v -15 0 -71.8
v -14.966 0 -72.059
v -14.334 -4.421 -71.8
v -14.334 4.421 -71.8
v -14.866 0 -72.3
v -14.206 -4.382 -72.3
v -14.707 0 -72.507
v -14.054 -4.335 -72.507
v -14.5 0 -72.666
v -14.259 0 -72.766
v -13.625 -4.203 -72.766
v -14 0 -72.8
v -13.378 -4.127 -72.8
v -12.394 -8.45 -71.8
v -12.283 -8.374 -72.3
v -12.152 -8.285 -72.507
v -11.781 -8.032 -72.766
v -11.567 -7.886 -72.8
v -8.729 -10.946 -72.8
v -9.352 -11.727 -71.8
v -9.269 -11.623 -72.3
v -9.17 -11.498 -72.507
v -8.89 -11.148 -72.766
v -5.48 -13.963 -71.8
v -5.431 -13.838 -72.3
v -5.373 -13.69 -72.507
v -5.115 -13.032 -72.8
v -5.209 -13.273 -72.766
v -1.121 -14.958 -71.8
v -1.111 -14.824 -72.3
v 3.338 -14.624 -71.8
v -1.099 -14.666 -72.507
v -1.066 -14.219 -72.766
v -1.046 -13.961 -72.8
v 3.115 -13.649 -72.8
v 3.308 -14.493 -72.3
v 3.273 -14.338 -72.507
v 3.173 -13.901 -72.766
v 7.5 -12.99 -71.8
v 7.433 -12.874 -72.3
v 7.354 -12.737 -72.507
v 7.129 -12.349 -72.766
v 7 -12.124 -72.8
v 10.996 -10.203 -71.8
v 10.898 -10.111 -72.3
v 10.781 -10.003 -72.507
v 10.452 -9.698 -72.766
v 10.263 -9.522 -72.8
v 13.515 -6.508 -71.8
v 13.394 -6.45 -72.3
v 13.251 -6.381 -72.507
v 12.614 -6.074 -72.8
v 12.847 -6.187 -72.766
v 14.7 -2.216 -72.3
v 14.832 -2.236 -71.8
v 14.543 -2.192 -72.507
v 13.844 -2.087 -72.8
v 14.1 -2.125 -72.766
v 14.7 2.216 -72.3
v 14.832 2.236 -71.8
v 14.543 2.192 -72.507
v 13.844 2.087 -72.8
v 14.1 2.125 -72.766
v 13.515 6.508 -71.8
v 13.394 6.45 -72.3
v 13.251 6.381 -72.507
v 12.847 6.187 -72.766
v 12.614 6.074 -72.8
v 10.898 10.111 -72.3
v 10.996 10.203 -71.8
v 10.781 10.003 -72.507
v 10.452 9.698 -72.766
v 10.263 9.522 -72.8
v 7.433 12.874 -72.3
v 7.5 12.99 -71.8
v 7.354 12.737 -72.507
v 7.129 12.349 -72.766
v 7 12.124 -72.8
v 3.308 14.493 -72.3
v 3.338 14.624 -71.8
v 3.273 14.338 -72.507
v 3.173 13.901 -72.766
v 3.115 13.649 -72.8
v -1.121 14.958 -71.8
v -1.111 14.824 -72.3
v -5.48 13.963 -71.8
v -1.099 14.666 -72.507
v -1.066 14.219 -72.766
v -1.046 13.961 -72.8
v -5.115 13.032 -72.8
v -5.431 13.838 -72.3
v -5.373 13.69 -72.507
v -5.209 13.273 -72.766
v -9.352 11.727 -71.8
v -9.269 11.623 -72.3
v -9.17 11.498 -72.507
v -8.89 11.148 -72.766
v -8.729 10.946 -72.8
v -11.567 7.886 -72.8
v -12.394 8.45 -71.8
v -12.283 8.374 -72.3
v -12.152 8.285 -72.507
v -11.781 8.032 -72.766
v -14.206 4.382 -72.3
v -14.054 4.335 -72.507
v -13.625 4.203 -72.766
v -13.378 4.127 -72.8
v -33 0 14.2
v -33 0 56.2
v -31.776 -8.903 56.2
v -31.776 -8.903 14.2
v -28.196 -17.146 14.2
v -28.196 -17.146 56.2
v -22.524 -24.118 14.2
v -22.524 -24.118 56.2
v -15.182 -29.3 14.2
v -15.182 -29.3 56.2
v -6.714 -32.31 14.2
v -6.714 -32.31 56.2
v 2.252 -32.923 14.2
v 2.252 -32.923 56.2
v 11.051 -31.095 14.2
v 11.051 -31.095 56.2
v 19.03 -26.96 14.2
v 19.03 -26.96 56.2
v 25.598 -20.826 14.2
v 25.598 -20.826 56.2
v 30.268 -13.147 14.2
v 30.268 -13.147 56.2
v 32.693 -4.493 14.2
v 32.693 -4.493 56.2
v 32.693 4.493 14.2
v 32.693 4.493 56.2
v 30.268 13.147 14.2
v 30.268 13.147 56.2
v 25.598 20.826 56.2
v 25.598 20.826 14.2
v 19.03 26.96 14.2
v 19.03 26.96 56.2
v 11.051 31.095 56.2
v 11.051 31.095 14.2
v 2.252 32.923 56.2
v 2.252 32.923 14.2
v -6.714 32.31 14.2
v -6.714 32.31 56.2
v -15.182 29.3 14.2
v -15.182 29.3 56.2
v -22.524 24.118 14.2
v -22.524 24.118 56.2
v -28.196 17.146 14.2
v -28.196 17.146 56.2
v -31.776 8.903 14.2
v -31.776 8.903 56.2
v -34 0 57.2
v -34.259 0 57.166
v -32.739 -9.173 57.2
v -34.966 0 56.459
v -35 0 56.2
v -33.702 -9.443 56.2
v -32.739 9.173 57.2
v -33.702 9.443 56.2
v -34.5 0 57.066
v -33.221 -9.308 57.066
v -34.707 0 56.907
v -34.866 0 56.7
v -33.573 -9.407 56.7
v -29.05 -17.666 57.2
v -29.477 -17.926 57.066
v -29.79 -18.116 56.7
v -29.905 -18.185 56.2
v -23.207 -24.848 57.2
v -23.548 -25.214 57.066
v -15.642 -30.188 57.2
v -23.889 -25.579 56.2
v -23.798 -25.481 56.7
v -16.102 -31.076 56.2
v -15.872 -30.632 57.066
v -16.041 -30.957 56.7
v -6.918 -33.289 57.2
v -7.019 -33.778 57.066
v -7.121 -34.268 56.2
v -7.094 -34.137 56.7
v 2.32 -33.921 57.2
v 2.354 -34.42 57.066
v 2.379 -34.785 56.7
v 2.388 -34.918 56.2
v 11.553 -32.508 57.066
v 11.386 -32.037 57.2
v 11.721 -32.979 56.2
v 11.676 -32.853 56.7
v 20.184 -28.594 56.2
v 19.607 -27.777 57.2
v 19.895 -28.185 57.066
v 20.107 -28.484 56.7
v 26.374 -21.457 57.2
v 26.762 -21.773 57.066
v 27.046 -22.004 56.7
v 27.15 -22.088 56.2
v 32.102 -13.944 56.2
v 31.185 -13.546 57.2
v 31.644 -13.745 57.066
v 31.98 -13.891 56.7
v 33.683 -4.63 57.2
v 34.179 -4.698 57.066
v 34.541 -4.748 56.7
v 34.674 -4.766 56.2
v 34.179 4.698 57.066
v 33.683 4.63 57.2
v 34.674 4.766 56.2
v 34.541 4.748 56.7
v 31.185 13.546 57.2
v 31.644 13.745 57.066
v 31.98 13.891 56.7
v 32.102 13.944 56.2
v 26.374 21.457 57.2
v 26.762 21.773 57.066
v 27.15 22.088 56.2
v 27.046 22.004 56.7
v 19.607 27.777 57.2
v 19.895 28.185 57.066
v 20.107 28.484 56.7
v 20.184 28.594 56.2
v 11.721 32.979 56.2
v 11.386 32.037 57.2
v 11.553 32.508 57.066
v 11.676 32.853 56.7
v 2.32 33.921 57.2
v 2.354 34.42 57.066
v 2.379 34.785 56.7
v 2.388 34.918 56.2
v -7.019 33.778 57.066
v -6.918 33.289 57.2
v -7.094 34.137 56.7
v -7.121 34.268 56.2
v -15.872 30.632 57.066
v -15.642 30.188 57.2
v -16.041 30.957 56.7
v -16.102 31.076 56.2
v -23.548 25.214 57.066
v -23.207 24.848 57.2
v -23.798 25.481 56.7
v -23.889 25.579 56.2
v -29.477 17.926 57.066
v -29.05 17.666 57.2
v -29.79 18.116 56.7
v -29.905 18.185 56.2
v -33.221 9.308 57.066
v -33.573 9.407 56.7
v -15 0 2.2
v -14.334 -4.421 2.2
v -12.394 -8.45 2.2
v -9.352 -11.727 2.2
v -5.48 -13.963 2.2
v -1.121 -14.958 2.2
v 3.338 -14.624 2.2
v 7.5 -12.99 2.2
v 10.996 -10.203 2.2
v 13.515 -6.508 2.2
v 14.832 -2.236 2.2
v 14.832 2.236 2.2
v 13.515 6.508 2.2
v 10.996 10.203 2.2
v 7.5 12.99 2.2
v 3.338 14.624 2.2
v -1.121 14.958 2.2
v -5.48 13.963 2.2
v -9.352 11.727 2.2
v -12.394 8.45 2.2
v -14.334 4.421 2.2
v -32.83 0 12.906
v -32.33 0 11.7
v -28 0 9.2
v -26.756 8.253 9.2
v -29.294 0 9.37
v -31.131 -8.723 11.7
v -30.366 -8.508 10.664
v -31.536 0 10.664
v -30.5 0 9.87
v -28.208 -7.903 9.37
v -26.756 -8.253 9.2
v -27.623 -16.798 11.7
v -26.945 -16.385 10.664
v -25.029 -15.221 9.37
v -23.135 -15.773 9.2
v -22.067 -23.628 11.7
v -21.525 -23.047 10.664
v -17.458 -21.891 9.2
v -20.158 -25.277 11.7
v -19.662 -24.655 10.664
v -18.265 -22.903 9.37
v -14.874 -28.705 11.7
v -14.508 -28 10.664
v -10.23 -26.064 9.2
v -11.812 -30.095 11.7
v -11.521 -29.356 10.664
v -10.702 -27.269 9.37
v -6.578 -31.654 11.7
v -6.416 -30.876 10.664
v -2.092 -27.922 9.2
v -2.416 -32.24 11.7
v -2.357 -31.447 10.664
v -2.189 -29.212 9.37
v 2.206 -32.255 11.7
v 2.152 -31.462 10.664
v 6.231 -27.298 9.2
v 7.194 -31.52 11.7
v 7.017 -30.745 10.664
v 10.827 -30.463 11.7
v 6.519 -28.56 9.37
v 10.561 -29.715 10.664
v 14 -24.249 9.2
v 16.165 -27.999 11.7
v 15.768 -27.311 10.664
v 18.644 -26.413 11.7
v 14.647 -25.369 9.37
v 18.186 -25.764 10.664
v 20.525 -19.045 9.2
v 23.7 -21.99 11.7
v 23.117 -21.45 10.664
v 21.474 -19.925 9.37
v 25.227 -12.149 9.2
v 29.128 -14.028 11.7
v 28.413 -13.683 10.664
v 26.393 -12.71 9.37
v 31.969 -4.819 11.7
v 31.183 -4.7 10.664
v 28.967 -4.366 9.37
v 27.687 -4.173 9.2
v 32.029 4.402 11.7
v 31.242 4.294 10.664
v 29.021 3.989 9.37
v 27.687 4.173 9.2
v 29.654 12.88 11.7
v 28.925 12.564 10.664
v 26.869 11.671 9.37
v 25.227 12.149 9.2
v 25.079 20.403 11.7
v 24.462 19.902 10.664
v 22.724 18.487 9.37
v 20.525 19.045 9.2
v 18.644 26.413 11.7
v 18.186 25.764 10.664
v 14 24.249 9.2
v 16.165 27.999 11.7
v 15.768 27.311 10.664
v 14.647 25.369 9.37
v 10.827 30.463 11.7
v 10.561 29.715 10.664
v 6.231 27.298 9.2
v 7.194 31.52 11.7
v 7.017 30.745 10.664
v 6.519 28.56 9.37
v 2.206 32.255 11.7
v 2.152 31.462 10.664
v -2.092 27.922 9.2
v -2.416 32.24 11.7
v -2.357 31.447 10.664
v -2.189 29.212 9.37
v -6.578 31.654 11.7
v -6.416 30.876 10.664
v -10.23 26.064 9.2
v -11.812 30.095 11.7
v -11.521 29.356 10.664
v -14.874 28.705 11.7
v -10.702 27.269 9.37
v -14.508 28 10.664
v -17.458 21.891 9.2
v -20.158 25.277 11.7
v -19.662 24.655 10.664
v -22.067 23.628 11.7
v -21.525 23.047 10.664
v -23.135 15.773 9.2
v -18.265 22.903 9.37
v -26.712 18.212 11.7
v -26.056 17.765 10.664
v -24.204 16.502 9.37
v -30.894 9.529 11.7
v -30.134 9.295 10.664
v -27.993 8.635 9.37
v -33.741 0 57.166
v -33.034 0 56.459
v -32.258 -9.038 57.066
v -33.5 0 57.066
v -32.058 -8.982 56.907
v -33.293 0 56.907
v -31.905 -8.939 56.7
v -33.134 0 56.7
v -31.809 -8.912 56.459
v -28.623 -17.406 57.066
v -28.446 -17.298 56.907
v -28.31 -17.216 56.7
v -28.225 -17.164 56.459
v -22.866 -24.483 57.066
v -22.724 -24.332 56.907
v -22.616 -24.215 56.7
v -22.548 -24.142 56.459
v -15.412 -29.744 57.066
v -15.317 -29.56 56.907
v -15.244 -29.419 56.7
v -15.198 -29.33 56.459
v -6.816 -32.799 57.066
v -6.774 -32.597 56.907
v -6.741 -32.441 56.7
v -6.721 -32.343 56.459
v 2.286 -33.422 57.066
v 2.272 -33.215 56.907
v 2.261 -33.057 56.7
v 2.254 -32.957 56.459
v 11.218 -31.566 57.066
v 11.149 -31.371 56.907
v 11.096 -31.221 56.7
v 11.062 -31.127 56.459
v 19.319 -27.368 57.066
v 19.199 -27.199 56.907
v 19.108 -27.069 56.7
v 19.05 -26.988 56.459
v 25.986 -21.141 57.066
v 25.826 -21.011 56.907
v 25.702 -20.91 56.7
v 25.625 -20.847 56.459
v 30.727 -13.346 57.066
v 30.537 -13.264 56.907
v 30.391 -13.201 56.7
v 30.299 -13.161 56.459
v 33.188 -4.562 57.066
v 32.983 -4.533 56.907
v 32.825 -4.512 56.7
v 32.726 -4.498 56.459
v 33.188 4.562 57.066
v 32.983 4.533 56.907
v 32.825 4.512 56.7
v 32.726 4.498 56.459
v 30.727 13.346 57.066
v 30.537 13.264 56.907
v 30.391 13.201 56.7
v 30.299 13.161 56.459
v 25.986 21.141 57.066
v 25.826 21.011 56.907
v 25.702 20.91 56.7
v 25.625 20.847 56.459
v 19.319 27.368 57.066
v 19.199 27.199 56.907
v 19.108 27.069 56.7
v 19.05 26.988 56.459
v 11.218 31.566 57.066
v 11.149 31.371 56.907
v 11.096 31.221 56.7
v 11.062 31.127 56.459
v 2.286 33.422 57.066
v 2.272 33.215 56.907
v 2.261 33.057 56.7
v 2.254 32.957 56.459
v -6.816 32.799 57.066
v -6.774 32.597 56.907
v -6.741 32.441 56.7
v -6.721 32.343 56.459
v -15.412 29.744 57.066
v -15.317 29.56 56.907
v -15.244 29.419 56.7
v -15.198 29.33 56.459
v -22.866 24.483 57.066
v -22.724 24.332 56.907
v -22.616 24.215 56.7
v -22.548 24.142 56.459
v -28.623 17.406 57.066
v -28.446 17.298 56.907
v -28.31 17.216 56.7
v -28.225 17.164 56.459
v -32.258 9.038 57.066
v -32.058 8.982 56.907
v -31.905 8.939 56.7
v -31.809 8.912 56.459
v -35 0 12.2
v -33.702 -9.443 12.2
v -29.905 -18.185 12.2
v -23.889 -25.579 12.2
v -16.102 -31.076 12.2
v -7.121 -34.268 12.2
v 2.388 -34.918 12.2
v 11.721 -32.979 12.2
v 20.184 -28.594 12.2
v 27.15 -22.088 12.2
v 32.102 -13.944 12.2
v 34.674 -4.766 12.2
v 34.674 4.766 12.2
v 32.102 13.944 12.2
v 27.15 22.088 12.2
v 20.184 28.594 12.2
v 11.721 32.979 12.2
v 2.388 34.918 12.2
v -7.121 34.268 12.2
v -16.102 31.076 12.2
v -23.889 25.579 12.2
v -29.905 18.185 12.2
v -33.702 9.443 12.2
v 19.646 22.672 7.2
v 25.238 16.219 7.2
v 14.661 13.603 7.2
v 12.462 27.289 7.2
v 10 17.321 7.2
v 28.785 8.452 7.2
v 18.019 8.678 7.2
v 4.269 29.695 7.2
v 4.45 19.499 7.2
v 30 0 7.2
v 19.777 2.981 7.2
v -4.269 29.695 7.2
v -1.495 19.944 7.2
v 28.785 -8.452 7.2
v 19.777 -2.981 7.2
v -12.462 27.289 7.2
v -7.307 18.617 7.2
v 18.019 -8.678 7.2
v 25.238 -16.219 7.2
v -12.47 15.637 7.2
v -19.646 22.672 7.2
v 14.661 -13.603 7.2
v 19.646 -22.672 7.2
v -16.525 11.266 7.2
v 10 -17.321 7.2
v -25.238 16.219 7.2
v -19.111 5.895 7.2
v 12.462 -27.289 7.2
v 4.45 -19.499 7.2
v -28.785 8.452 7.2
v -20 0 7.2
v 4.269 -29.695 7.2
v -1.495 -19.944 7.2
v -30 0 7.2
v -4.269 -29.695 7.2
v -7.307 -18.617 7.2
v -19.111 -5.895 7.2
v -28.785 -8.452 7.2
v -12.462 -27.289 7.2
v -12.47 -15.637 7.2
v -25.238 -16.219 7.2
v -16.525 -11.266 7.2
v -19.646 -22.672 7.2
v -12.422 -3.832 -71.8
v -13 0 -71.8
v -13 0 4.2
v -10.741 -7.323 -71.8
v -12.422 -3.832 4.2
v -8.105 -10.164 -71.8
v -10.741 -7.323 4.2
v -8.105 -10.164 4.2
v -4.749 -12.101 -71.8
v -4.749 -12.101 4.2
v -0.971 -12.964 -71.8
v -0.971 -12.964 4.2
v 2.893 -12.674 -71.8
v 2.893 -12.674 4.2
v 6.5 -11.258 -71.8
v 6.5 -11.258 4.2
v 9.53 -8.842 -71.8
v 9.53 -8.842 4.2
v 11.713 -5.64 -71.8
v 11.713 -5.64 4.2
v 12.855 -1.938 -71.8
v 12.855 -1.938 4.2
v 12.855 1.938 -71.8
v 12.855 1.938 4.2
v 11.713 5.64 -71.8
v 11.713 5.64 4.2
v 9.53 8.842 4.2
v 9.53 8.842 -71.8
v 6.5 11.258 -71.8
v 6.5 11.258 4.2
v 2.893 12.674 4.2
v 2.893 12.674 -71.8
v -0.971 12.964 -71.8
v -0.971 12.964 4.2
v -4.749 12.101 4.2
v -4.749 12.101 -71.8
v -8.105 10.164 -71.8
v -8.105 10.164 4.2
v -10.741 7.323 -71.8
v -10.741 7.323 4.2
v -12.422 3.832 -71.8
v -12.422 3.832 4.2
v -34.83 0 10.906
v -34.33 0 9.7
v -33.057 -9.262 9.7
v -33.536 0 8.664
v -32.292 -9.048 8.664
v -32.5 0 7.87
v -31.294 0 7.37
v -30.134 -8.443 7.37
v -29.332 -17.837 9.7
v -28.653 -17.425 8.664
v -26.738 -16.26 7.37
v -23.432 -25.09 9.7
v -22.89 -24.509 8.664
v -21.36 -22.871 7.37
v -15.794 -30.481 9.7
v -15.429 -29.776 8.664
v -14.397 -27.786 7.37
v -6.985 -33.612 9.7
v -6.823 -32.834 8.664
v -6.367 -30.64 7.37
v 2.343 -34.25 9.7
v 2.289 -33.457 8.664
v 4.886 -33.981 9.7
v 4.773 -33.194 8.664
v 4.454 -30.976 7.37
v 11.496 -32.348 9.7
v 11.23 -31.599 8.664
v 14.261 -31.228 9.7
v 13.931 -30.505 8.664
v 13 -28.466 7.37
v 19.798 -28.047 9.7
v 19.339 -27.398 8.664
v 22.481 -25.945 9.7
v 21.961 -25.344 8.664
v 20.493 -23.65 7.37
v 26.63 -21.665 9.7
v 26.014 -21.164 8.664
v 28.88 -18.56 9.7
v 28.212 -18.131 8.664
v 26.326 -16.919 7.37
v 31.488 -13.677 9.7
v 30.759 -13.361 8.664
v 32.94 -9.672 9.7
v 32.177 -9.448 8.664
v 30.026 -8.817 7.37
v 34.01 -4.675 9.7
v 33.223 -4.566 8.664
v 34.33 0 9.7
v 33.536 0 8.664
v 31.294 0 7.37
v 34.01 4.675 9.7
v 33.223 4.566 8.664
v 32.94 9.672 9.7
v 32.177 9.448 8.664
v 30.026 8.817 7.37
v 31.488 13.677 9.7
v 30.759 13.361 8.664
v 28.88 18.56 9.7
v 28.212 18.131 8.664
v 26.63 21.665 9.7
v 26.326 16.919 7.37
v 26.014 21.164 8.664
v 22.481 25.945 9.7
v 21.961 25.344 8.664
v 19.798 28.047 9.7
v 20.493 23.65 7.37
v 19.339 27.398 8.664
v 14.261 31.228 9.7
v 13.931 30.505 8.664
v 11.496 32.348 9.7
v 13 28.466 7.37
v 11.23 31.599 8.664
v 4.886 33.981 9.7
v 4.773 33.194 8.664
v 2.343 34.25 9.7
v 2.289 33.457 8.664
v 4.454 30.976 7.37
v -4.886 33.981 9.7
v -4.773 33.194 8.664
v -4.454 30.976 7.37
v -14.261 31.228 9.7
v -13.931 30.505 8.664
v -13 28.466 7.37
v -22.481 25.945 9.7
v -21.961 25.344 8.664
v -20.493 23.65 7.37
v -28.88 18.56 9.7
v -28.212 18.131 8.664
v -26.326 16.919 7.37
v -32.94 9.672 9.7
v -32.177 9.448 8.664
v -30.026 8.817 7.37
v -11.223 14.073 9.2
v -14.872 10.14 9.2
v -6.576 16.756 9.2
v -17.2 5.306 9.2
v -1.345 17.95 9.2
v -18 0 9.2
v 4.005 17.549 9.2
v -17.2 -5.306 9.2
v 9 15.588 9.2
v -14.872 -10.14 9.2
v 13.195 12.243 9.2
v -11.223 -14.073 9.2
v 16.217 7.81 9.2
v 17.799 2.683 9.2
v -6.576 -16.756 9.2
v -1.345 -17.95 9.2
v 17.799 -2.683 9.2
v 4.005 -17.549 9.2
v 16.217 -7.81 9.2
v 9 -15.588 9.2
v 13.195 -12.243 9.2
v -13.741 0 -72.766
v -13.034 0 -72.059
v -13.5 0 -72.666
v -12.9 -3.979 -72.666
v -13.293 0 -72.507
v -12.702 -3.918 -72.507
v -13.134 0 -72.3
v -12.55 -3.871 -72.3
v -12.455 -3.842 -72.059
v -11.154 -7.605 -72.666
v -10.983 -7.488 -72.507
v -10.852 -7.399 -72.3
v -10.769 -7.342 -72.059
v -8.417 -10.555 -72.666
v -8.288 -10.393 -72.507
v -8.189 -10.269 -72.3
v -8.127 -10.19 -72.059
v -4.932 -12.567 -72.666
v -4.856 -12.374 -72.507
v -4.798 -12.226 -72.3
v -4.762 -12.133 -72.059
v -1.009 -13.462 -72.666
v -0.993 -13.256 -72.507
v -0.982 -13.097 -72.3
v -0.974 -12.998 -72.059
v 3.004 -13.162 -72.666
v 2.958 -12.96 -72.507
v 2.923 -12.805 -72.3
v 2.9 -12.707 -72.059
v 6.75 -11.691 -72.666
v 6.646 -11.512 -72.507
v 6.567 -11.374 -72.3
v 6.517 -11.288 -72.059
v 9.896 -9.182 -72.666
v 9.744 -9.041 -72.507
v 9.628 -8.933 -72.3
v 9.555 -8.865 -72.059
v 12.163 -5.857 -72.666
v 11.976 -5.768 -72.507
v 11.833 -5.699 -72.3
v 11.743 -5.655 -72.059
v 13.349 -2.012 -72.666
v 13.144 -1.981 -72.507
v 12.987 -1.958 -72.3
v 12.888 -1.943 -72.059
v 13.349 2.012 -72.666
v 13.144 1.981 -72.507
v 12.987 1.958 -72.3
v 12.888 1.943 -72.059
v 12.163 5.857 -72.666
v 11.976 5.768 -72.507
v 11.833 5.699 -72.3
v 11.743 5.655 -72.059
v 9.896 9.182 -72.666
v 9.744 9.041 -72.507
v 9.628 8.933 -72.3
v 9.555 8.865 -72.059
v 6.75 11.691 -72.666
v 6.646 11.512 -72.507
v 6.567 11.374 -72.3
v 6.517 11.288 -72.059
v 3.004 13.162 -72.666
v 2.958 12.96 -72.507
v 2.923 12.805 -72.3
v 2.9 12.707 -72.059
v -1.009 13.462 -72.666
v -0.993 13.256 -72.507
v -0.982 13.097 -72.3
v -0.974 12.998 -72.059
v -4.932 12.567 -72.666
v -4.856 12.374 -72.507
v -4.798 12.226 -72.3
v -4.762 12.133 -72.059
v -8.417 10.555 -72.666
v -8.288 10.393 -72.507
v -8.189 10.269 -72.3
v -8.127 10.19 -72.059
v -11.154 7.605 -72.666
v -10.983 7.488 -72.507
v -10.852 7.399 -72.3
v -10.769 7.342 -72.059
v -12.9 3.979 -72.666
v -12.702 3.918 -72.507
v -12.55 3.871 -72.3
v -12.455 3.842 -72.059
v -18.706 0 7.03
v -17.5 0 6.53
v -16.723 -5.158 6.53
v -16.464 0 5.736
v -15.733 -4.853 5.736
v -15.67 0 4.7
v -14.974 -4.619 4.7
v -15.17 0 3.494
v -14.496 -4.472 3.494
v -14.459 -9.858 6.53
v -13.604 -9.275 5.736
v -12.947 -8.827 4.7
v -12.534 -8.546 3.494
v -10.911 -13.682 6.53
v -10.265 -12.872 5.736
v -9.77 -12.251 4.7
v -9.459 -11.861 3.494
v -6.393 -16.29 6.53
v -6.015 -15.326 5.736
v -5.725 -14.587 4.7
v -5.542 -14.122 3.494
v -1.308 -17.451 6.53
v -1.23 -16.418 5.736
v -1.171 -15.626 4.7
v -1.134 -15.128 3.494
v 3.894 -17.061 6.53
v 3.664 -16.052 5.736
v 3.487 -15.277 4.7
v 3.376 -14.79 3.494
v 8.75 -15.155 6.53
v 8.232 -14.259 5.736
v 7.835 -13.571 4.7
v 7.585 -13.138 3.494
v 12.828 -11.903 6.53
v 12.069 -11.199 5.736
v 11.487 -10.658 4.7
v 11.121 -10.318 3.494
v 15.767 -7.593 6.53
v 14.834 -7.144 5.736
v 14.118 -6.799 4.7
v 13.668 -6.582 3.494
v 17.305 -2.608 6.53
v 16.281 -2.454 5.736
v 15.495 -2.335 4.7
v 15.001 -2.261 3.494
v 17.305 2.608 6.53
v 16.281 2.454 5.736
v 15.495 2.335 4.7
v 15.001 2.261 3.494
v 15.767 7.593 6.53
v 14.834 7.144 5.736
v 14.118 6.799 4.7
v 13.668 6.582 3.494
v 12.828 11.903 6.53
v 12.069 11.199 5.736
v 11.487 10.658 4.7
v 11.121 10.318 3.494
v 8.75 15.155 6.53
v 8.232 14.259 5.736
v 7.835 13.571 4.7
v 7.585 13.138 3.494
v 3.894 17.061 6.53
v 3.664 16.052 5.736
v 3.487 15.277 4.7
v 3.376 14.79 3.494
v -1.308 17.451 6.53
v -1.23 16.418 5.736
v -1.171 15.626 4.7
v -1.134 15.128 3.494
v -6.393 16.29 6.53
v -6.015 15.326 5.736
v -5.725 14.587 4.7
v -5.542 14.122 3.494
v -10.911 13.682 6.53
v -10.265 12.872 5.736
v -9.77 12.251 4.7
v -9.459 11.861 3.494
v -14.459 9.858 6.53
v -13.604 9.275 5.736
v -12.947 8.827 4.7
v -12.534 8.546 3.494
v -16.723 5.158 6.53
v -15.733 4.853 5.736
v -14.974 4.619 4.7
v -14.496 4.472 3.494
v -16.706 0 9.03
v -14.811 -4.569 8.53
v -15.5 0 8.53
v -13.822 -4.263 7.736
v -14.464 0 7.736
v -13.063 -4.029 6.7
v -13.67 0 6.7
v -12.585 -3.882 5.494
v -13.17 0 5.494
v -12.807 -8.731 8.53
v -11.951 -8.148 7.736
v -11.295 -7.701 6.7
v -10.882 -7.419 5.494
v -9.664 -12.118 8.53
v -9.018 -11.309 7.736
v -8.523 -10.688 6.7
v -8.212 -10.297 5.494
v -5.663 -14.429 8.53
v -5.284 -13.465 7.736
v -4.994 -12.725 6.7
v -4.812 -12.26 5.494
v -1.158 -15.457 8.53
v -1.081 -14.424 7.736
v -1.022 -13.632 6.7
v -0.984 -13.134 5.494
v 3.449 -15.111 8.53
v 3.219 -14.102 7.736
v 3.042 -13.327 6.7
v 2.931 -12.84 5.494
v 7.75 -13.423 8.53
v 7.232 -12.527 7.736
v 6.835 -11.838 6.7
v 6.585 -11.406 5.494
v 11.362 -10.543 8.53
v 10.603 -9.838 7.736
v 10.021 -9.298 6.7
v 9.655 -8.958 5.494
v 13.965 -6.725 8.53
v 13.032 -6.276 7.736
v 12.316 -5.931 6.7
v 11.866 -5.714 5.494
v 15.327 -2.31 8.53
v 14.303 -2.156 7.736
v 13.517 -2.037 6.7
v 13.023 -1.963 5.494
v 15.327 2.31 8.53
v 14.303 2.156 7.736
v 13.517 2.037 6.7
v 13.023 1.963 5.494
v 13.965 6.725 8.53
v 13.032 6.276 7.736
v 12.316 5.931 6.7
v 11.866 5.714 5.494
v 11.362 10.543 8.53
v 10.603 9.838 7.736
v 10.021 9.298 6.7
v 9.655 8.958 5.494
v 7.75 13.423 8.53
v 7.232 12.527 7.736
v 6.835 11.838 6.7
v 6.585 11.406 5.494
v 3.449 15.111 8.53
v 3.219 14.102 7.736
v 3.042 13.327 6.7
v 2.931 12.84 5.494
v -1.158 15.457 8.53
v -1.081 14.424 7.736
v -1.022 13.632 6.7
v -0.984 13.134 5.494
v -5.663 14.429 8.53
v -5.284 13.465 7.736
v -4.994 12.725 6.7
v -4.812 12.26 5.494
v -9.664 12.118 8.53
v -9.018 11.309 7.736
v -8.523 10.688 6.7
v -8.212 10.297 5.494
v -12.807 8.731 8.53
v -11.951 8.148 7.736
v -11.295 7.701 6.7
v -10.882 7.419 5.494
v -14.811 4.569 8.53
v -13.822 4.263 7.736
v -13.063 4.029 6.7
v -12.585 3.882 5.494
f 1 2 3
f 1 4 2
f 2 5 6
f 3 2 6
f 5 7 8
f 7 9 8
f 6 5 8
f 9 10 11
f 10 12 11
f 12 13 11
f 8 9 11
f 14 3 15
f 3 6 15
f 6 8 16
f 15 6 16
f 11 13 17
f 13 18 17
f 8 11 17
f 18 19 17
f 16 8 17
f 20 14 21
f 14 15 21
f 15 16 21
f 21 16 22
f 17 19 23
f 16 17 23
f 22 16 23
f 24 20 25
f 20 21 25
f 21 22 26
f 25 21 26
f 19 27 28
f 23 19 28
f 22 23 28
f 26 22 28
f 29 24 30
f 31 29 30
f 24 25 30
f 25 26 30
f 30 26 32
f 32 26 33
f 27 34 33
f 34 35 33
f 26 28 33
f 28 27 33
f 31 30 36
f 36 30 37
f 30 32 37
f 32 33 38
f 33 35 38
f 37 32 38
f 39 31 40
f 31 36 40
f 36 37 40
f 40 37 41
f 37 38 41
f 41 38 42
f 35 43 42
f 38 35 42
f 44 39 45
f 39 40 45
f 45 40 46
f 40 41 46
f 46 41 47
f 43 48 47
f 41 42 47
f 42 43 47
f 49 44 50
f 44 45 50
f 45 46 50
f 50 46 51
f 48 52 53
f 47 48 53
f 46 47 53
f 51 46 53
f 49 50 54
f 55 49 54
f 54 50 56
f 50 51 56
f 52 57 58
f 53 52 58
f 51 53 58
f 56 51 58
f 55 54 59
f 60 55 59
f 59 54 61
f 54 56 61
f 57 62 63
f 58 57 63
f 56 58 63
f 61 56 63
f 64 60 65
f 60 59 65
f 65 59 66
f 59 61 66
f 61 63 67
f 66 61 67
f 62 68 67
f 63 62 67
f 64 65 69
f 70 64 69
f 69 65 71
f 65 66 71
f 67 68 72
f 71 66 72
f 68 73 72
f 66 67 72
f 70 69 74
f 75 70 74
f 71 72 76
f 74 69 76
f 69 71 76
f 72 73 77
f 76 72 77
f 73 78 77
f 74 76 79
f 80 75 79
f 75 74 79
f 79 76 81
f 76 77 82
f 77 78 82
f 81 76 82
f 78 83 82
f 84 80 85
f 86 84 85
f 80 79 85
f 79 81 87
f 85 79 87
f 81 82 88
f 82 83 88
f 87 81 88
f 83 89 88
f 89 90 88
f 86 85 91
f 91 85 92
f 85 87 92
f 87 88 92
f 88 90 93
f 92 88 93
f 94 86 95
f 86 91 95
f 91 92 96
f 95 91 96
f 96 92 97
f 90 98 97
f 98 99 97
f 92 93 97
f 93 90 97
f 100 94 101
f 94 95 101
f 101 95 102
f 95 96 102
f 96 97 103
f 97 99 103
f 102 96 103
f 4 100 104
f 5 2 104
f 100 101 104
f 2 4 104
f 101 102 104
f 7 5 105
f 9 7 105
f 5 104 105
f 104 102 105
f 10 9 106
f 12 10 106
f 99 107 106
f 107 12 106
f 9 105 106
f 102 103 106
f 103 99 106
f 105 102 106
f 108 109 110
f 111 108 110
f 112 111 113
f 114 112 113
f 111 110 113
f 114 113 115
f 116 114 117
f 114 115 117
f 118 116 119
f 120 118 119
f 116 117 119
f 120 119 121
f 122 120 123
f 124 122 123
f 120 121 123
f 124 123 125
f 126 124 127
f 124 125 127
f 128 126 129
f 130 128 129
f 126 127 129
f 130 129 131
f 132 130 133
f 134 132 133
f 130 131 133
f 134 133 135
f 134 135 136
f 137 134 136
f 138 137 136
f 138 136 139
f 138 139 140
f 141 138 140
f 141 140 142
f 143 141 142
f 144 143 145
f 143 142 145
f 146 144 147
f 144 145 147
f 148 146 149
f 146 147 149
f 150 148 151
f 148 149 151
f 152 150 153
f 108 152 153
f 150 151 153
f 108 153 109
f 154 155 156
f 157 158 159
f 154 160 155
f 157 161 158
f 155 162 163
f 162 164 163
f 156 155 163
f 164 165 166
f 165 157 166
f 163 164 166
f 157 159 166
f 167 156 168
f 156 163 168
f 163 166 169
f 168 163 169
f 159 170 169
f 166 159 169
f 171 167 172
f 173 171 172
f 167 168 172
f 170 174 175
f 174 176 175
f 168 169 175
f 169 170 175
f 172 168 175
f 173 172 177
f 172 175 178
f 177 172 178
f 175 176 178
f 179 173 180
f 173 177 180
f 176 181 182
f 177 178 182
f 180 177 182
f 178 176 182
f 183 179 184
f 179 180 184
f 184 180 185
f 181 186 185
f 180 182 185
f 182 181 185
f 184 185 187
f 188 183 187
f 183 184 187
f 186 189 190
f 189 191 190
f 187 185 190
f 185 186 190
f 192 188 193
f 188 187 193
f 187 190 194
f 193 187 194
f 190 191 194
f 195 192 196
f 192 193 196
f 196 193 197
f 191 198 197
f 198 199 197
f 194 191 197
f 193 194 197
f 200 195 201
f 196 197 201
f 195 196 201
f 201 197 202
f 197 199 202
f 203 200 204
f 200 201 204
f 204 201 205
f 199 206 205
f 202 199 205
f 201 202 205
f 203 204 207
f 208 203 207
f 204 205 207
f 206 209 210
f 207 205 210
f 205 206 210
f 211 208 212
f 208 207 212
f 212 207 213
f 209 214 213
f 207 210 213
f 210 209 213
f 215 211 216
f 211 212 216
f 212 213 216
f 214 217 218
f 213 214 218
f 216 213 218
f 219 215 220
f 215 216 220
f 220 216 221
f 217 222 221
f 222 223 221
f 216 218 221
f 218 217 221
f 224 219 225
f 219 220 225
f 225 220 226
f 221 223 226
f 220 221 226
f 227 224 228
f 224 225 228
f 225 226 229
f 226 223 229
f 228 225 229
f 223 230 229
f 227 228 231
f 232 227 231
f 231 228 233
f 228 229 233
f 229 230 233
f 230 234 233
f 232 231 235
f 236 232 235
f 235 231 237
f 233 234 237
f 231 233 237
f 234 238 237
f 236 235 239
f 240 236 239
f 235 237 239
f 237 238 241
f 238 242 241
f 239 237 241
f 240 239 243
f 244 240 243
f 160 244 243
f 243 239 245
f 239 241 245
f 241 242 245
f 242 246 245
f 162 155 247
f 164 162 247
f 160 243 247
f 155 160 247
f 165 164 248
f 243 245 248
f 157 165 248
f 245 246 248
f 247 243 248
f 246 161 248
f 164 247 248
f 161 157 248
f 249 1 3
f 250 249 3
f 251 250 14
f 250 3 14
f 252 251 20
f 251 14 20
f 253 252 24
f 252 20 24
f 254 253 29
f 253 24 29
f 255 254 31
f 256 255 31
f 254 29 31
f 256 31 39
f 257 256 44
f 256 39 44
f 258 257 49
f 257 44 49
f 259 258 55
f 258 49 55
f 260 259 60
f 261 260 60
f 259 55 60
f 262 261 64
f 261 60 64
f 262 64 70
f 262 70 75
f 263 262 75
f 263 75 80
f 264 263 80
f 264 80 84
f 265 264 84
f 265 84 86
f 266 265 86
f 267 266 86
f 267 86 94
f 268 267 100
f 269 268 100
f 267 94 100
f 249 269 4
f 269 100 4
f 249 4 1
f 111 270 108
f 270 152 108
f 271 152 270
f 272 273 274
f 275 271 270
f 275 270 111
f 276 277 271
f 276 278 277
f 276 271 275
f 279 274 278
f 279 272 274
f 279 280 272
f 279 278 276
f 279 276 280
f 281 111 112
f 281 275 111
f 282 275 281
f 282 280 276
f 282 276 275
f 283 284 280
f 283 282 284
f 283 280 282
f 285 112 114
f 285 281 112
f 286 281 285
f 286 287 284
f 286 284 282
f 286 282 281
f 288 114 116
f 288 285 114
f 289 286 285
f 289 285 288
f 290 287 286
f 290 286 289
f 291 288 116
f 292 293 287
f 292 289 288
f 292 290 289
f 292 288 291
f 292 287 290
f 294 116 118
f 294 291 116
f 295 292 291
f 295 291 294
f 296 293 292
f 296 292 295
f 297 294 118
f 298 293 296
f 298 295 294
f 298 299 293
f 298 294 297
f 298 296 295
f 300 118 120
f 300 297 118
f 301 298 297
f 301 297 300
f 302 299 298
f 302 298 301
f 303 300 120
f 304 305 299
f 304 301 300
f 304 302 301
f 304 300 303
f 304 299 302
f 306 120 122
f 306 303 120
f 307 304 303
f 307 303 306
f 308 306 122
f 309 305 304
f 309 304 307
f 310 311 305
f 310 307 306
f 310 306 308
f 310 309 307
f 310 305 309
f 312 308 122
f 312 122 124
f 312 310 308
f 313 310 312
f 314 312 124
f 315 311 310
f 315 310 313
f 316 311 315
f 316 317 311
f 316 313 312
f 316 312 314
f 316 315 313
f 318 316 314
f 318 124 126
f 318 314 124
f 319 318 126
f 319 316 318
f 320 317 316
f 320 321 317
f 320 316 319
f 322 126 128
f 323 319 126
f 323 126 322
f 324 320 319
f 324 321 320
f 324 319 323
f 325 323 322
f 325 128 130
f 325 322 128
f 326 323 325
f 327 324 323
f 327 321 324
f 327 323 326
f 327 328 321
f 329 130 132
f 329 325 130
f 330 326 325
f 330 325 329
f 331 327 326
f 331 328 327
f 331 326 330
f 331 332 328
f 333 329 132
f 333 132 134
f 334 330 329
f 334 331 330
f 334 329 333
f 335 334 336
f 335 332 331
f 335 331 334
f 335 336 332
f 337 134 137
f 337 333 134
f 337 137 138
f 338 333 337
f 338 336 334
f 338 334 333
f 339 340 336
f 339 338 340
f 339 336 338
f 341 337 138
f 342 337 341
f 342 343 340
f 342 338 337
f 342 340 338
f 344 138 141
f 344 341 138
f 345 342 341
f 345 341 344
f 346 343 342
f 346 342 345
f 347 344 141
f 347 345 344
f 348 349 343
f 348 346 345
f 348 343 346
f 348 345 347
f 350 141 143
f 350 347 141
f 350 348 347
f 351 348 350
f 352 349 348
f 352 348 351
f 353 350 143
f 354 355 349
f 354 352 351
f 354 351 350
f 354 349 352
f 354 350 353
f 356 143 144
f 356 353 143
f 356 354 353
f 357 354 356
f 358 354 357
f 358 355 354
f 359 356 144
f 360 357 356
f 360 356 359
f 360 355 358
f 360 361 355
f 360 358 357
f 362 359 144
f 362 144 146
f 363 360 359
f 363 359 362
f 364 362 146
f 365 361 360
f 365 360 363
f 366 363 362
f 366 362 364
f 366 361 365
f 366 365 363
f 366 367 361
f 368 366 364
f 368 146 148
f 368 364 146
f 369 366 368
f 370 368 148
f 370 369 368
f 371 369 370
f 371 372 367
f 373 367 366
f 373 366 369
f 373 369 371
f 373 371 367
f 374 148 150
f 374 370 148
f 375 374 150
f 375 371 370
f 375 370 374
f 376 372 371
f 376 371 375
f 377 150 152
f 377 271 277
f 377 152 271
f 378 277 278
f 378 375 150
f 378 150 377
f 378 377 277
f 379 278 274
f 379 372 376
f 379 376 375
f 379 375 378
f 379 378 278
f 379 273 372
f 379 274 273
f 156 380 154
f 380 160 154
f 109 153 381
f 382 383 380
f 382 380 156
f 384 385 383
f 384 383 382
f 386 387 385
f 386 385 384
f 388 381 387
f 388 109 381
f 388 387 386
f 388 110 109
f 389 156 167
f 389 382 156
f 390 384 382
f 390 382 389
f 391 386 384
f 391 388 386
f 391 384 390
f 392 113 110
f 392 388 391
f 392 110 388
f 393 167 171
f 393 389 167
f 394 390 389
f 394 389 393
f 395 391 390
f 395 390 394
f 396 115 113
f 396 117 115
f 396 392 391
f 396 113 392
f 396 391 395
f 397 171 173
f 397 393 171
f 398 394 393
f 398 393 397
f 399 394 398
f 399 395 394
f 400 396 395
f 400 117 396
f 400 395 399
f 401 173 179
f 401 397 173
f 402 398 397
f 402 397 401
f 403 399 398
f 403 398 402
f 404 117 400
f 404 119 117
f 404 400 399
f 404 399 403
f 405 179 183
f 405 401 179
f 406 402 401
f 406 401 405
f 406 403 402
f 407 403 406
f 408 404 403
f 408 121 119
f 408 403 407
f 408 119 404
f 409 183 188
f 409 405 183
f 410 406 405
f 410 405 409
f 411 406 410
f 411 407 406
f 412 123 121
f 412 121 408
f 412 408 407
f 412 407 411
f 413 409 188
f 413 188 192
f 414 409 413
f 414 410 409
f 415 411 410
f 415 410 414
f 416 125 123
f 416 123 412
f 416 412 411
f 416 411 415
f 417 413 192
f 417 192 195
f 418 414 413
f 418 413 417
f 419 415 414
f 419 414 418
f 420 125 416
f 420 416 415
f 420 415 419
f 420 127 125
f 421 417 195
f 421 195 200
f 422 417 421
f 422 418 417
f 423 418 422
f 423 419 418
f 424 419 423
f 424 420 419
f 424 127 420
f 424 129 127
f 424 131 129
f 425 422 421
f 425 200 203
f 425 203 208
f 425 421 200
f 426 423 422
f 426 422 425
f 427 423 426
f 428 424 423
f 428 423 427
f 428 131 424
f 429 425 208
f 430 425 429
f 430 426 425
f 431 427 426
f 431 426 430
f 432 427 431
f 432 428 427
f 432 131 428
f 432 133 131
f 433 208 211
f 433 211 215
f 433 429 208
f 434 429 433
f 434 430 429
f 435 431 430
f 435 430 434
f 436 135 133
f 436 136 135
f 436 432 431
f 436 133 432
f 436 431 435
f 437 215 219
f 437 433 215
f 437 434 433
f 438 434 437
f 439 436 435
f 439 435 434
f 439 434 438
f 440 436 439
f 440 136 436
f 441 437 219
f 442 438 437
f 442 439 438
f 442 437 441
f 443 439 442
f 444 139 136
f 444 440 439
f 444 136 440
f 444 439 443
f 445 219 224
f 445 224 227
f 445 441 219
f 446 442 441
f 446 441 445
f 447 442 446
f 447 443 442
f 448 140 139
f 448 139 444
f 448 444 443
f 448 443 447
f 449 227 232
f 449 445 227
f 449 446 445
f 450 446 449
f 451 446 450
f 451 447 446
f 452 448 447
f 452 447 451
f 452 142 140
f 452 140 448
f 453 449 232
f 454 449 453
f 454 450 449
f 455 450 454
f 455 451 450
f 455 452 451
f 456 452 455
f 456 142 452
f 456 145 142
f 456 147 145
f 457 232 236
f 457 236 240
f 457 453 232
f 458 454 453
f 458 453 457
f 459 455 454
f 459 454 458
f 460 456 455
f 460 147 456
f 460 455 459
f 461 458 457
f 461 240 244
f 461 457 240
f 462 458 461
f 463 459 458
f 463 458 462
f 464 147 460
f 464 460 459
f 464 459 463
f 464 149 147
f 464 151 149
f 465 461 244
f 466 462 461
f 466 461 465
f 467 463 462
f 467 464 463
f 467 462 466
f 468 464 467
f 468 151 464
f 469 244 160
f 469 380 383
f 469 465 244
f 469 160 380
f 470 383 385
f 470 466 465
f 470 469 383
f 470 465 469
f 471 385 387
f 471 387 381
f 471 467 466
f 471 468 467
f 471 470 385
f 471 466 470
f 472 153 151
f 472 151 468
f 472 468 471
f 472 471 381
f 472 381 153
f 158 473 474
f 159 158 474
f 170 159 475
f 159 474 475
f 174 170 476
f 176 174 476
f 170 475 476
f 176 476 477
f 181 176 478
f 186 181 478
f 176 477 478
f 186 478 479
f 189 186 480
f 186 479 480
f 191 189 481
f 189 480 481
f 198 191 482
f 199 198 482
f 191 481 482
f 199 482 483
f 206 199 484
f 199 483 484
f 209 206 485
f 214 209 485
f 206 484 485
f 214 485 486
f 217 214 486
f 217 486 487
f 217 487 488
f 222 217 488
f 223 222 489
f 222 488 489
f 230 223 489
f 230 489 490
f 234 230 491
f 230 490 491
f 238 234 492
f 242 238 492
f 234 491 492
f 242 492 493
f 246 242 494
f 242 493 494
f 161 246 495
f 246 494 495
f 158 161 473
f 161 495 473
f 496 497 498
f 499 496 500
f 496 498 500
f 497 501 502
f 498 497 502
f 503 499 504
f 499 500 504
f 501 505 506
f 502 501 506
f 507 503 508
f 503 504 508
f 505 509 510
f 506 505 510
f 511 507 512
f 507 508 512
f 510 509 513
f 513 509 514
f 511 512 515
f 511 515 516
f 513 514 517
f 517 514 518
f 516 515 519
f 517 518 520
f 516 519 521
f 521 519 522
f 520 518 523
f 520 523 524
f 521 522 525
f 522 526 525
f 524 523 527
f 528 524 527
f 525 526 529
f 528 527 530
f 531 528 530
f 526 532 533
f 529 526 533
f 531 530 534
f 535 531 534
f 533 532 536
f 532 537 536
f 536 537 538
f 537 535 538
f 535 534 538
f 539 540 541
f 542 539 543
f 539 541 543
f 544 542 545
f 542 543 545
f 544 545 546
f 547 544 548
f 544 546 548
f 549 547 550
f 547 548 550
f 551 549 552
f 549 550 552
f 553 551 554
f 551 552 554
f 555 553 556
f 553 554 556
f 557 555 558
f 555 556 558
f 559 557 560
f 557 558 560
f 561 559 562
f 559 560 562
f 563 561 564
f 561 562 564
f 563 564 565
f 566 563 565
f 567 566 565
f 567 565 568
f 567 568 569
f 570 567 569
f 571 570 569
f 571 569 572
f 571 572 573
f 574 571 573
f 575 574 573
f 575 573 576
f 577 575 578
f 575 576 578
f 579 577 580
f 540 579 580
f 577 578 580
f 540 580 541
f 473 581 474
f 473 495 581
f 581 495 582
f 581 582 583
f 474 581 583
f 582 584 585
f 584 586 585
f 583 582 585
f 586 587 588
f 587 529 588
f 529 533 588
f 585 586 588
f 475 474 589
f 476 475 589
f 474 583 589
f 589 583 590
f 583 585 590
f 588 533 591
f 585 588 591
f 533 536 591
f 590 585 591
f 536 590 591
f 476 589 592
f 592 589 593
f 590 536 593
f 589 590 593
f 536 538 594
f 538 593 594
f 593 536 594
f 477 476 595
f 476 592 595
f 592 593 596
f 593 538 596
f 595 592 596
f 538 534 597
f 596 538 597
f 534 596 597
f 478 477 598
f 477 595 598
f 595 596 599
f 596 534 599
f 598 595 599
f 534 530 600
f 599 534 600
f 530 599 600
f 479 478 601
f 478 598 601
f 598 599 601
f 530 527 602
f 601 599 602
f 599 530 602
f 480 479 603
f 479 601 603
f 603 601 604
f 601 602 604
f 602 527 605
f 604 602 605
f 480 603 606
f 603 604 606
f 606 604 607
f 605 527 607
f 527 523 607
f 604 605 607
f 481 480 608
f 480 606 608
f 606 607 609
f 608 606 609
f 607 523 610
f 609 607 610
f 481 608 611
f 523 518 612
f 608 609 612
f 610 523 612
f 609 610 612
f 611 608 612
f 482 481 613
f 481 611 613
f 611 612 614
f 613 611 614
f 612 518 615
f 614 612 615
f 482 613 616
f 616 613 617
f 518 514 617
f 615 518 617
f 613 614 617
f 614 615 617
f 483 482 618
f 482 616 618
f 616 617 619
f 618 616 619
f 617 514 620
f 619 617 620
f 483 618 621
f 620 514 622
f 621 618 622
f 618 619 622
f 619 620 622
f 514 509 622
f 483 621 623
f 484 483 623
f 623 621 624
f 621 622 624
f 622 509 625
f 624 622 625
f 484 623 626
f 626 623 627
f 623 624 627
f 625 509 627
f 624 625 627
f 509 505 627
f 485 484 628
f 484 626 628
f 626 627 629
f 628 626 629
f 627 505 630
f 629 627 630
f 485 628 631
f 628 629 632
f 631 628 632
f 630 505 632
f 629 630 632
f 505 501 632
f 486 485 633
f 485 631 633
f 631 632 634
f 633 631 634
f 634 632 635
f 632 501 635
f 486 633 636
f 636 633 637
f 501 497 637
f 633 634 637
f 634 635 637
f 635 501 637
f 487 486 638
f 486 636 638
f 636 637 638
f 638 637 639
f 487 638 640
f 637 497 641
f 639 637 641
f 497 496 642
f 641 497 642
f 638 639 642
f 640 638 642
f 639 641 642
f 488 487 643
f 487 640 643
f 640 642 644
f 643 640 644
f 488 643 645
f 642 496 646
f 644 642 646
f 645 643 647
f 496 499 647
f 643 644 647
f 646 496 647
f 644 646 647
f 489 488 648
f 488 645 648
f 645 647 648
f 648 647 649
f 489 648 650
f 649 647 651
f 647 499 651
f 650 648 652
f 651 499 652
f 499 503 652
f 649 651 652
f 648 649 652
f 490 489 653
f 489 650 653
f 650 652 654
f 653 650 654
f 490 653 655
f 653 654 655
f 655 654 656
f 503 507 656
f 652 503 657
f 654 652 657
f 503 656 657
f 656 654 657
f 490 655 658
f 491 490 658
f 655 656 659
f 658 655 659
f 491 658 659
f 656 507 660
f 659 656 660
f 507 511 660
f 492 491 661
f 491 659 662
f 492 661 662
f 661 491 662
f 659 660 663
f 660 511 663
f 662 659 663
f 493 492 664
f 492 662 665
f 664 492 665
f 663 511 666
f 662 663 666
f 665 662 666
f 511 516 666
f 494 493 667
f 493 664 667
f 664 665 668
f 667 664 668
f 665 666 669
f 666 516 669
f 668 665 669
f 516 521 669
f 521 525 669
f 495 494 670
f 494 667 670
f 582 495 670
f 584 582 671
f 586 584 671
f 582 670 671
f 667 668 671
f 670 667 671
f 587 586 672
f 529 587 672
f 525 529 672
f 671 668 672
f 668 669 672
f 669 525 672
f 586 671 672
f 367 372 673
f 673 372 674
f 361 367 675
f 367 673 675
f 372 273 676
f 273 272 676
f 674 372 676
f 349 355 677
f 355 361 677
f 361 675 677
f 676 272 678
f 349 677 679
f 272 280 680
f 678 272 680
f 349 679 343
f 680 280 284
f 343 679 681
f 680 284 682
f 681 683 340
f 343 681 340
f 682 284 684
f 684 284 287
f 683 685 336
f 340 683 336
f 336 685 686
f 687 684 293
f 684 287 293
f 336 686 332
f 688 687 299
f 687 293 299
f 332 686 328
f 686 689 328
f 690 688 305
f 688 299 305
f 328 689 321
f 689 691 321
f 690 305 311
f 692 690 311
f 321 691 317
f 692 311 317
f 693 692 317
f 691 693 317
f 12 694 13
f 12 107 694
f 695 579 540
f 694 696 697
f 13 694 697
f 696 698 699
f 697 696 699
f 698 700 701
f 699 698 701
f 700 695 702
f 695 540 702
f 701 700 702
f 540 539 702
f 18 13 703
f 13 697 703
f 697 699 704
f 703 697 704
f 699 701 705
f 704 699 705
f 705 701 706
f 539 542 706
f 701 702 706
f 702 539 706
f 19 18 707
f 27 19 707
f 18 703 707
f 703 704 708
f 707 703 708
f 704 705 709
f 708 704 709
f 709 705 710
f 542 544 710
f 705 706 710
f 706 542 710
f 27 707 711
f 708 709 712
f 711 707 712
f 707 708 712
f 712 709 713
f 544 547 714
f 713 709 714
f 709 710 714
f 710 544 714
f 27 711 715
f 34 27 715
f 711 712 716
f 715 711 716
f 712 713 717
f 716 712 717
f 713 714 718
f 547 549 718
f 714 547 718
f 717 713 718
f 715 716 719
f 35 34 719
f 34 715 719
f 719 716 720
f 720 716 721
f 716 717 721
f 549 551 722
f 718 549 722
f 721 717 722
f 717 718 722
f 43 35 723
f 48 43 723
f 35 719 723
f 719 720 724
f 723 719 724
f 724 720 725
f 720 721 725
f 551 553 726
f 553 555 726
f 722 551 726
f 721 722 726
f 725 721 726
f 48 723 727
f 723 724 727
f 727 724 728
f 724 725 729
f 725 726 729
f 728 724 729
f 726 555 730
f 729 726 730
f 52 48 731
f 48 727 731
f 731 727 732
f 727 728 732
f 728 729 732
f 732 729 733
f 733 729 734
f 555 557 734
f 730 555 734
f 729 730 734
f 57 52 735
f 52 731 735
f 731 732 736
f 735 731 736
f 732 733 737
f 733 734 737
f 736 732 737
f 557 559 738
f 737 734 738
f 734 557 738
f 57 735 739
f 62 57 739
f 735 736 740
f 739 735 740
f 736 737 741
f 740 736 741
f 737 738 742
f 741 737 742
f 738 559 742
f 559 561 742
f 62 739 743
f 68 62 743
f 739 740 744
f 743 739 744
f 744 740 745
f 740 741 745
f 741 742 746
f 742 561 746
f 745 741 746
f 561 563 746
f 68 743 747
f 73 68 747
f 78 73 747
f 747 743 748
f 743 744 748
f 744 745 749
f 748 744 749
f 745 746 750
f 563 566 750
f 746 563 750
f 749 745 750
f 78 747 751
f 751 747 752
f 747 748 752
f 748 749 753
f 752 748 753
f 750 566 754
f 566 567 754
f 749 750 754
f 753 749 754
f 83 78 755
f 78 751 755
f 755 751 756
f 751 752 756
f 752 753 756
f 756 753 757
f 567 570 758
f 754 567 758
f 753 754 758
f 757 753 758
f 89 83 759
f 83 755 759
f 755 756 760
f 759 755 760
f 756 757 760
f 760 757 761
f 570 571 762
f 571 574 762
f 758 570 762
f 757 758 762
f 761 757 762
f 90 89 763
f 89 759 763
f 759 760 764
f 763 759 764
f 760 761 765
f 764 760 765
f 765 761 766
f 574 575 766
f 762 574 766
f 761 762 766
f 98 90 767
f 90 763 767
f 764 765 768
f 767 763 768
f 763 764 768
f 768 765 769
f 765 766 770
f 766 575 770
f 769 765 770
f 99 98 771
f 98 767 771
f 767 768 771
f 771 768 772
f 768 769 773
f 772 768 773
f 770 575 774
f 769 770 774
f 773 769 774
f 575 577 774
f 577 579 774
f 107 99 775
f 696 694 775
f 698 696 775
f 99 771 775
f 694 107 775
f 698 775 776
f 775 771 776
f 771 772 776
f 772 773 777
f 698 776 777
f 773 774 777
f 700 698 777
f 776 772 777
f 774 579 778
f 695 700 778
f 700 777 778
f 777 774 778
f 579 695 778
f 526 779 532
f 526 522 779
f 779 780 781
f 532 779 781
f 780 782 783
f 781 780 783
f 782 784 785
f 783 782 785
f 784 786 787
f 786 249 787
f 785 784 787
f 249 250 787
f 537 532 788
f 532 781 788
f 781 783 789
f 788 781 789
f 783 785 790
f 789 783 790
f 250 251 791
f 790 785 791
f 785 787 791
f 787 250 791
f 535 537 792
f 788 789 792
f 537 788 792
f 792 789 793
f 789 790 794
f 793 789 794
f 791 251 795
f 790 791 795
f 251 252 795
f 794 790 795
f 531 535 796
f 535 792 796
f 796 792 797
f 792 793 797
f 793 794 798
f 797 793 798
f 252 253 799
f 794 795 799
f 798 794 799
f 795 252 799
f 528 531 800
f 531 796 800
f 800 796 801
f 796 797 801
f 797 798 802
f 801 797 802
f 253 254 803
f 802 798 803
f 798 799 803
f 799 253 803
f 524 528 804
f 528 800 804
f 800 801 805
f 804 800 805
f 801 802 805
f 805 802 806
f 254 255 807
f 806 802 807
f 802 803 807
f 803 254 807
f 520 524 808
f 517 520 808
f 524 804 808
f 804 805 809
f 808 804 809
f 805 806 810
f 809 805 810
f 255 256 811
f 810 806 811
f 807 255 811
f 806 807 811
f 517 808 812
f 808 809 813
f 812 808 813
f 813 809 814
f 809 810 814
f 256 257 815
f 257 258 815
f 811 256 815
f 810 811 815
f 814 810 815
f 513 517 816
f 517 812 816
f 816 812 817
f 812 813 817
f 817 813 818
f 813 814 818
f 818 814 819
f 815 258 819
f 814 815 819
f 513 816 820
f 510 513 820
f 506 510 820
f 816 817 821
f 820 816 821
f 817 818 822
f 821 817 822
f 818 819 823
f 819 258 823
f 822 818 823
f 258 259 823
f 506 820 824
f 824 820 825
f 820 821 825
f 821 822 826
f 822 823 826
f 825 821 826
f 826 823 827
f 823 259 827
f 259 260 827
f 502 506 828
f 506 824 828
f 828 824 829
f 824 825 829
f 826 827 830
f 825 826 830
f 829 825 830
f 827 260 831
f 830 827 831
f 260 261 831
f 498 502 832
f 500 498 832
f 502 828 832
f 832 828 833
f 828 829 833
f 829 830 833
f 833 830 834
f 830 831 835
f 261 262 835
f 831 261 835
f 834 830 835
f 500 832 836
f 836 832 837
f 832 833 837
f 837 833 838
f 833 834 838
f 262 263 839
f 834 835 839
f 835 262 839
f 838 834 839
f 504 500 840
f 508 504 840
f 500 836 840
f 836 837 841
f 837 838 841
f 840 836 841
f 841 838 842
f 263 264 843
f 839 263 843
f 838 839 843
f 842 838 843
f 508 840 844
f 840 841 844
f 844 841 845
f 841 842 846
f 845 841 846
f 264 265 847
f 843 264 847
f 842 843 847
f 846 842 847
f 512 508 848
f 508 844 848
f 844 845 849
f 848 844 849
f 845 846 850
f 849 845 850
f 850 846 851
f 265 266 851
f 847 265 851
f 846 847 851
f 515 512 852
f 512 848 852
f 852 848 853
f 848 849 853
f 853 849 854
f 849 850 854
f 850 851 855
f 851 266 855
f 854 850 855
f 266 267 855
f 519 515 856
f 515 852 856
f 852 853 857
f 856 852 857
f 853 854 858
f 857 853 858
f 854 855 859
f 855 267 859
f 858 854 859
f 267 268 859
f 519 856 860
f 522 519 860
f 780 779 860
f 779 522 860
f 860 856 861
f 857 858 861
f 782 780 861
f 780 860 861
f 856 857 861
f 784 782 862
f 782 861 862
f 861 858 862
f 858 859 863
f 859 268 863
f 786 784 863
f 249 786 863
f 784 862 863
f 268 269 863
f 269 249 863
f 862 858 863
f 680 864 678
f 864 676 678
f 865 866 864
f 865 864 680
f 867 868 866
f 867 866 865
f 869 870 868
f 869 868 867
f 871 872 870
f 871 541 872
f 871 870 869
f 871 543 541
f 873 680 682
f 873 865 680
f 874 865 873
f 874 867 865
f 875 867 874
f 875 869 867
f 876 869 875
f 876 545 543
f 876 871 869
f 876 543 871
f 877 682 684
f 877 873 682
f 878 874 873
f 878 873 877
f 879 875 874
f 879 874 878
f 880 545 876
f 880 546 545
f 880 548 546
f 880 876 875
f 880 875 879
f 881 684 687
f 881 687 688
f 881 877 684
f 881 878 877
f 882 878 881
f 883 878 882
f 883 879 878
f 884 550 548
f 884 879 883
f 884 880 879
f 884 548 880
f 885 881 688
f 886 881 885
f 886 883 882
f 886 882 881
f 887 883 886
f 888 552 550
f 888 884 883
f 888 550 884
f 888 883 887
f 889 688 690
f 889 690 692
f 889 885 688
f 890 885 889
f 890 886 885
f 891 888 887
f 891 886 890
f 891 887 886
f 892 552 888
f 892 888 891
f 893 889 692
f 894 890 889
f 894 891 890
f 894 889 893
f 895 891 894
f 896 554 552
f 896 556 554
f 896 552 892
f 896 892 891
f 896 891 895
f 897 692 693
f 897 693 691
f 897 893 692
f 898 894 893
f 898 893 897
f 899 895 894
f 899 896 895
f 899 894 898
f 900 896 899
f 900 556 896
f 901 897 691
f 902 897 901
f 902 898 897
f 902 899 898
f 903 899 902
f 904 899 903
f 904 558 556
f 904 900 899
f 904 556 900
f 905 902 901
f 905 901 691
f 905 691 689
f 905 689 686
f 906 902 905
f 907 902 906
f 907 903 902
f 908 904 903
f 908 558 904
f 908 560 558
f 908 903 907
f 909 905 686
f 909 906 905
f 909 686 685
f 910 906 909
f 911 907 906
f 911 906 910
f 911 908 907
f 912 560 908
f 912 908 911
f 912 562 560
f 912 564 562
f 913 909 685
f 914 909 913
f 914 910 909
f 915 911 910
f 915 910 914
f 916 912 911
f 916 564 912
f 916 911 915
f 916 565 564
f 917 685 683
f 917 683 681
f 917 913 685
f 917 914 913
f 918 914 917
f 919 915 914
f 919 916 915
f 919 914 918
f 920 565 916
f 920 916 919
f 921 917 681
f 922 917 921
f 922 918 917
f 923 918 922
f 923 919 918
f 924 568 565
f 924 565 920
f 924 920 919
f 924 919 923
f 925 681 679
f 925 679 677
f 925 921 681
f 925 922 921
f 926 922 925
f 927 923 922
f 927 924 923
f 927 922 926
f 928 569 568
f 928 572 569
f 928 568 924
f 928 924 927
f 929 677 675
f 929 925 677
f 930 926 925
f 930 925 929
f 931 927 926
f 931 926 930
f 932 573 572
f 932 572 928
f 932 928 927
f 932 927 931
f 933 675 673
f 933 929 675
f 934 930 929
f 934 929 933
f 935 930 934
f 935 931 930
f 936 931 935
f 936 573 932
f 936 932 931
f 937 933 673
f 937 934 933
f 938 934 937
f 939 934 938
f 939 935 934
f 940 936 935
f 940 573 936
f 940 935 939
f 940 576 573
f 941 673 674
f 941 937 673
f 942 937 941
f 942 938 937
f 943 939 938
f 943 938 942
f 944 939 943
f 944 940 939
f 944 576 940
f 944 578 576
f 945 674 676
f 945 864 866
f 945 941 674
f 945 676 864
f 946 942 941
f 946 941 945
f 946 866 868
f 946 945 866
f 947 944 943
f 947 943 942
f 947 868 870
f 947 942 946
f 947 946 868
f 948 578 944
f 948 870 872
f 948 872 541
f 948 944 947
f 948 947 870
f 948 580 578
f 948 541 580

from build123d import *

# Parameters (mm, degrees)
F2_R = 0.99999
F3_R = 5
F4_R = 5


# Not quite as in the source:
# - a fillet or chamfer is up to 0.001 mm smaller than in the source, because OpenCascade refuses the exact size


with BuildPart() as f1:
    # F0 (on Front) → F1 (revolve)
    with BuildSketch(Plane.XZ):
        Polygon((-33, 57.2000007471), (-35, 57.2000007471), (-35, 7.2000007471), (-15, 7.2000007471), (-15, -72.7999992529), (-13, -72.7999992529), (-13, 9.2000007471), (-33, 9.2000007471), align=None)
    revolve(axis=Axis((0, 0, -7.7999992529), (0, 0, 1)))

    # F2 (radius 1 in the source; OpenCascade refuses exactly that, so slightly less here)
    f2_edges = [f1.edges().sort_by_distance(p)[0] for p in [
        (35, 0, 57.200001),
        (33, 0, 57.200001),
        (15, 0, -72.799999),
        (13, 0, -72.799999),
    ]]
    fillet(f2_edges, radius=F2_R)

    # F3
    f3_edges = [f1.edges().sort_by_distance(p)[0] for p in [
        (15, 0, 7.200001),
        (35, 0, 7.200001),
    ]]
    fillet(f3_edges, radius=F3_R)

    # F4
    f4_edges = [f1.edges().sort_by_distance(p)[0] for p in [
        (13, 0, 9.200001),
        (33, 0, 9.200001),
    ]]
    fillet(f4_edges, radius=F4_R)


solid = f1.part
